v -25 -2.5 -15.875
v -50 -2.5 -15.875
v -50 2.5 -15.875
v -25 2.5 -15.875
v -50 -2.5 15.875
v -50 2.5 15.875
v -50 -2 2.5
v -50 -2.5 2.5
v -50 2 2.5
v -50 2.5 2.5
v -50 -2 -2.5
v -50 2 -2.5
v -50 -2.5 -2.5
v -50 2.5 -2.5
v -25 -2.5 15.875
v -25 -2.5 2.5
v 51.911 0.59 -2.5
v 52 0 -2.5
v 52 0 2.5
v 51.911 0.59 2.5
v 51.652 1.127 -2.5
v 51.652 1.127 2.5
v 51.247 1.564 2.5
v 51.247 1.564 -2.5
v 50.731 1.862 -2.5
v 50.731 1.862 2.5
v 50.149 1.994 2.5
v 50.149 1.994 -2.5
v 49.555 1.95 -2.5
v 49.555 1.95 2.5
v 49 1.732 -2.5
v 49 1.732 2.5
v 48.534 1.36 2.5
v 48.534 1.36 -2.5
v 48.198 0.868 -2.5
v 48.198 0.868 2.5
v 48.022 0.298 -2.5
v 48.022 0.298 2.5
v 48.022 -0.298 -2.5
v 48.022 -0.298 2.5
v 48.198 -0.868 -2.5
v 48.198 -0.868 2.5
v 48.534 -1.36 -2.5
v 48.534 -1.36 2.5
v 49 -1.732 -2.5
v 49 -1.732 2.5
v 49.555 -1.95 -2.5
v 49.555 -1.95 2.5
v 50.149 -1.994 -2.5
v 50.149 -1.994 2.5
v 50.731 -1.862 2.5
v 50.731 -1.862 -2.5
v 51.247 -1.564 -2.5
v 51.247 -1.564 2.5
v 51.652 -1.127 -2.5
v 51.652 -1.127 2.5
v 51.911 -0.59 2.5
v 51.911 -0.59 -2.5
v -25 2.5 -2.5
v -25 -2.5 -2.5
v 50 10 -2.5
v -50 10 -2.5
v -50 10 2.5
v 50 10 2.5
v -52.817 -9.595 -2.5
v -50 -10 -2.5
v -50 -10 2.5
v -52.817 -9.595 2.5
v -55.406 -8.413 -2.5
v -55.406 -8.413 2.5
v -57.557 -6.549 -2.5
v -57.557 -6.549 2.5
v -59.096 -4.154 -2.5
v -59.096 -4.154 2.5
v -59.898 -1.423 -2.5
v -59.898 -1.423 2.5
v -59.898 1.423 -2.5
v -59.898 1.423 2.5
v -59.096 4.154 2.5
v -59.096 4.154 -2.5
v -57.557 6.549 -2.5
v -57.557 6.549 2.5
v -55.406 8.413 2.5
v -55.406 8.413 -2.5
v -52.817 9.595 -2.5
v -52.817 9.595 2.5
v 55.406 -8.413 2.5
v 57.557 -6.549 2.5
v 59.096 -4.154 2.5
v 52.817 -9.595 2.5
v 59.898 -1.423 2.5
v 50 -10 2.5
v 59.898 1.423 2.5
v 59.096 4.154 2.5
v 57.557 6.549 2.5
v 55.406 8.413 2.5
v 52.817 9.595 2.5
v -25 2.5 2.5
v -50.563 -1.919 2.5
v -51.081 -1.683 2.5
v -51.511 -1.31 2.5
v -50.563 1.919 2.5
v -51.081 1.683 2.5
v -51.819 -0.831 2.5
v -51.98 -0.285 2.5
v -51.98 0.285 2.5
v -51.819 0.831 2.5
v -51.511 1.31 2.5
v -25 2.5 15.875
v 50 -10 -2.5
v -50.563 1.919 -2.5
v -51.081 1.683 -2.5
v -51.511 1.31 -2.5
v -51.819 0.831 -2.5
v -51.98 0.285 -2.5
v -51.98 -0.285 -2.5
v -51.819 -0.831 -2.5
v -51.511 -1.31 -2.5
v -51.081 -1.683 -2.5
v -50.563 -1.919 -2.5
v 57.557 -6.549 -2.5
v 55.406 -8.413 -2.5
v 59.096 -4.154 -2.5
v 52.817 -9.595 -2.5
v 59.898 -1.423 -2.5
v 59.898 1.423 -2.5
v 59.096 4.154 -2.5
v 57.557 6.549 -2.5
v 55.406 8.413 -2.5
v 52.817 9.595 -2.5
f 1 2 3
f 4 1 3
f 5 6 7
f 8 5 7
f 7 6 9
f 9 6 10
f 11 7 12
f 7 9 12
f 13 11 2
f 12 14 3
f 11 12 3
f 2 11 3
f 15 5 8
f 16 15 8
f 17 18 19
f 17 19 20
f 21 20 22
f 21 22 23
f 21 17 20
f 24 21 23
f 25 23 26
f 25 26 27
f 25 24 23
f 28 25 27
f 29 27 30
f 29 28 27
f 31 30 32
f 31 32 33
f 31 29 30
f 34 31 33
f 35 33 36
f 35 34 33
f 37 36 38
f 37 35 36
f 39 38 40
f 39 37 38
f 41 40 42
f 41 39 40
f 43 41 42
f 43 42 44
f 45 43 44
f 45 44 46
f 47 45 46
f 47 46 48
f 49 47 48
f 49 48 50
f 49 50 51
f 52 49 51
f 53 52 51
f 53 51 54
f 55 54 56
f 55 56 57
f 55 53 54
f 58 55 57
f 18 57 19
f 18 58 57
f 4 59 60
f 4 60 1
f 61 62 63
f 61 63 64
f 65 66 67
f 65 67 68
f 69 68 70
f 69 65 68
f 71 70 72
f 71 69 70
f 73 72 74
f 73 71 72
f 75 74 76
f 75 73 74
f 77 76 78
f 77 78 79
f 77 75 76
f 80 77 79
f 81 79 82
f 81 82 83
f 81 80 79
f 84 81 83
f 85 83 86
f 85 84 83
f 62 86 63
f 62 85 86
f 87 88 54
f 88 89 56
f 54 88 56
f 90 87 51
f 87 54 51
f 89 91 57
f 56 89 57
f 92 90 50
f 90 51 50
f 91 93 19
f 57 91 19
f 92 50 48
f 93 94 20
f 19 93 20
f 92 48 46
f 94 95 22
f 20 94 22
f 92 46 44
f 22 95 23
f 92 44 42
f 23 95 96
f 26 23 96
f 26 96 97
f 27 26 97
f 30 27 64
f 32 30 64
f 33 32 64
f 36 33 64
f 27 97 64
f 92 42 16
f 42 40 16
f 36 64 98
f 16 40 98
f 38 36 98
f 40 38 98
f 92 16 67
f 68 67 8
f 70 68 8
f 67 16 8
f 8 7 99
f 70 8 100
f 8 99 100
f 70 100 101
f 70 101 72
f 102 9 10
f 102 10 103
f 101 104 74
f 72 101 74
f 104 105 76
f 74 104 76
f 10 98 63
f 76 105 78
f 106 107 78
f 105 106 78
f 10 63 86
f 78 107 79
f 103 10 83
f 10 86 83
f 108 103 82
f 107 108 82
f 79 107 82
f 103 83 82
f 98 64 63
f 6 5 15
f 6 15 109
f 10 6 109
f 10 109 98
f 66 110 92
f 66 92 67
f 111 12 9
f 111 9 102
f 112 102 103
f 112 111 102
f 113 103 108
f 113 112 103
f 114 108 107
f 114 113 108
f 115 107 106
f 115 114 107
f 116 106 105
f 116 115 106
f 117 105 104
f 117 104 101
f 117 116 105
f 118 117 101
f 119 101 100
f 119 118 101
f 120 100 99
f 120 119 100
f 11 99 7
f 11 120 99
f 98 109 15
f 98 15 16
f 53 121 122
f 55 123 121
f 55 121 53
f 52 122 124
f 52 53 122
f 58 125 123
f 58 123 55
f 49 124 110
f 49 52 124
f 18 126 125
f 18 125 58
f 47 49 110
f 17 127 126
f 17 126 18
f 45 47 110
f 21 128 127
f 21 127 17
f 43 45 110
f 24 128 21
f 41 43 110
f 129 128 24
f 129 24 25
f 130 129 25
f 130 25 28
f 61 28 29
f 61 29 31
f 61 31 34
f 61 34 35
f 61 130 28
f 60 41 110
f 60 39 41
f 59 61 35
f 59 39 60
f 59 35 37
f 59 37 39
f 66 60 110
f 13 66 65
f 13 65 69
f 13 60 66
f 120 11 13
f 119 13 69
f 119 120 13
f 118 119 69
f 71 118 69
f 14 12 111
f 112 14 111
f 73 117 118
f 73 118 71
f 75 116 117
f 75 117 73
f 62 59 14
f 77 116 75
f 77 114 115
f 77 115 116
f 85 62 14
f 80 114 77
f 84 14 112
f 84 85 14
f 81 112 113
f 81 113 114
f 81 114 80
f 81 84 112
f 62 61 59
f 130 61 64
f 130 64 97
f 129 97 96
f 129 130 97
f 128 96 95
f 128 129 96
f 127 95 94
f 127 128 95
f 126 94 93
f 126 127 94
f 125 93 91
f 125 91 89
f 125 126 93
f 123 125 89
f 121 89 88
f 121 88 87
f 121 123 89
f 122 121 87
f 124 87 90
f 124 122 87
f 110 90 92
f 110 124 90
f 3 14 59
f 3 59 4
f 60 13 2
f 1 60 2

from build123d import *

# Parameters (mm, degrees)
BOSS_EXTRUDE1_DEPTH      = 2.5
BOSS_EXTRUDE1_DEPTH_BACK = 2.5
SKETCH1_R                = 2
BOSS_EXTRUDE2_START      = -50
SKETCH2_W                = 31.75
SKETCH2_H                = 5
BOSS_EXTRUDE2_DEPTH      = 25


with BuildPart() as part:
    # Sketch1 → Boss-Extrude1 (new, two sides: drawn at the far end of the back side and taken through both)
    with BuildSketch(Plane.XY.offset(-BOSS_EXTRUDE1_DEPTH_BACK)):
        with BuildLine():
            Line((-50, 10), (50, 10))
            ThreePointArc((50, 10), (60, 0), (50, -10))
            Line((50, -10), (-50, -10))
            ThreePointArc((-50, -10), (-60, 0), (-50, 10))
        make_face()
        with Locations((-50, 0)):
            Circle(SKETCH1_R, mode=Mode.SUBTRACT)
        with Locations((50, 0)):
            Circle(SKETCH1_R, mode=Mode.SUBTRACT)
    extrude(amount=BOSS_EXTRUDE1_DEPTH + BOSS_EXTRUDE1_DEPTH_BACK)

    # Sketch2 → Boss-Extrude2 (add)
    with BuildSketch(Plane(origin=(0, 0, 0), x_dir=(0, 0, -1), z_dir=(1, 0, 0)).offset(BOSS_EXTRUDE2_START)):
        Rectangle(SKETCH2_W, SKETCH2_H)
    extrude(amount=BOSS_EXTRUDE2_DEPTH)


solid = part.part
